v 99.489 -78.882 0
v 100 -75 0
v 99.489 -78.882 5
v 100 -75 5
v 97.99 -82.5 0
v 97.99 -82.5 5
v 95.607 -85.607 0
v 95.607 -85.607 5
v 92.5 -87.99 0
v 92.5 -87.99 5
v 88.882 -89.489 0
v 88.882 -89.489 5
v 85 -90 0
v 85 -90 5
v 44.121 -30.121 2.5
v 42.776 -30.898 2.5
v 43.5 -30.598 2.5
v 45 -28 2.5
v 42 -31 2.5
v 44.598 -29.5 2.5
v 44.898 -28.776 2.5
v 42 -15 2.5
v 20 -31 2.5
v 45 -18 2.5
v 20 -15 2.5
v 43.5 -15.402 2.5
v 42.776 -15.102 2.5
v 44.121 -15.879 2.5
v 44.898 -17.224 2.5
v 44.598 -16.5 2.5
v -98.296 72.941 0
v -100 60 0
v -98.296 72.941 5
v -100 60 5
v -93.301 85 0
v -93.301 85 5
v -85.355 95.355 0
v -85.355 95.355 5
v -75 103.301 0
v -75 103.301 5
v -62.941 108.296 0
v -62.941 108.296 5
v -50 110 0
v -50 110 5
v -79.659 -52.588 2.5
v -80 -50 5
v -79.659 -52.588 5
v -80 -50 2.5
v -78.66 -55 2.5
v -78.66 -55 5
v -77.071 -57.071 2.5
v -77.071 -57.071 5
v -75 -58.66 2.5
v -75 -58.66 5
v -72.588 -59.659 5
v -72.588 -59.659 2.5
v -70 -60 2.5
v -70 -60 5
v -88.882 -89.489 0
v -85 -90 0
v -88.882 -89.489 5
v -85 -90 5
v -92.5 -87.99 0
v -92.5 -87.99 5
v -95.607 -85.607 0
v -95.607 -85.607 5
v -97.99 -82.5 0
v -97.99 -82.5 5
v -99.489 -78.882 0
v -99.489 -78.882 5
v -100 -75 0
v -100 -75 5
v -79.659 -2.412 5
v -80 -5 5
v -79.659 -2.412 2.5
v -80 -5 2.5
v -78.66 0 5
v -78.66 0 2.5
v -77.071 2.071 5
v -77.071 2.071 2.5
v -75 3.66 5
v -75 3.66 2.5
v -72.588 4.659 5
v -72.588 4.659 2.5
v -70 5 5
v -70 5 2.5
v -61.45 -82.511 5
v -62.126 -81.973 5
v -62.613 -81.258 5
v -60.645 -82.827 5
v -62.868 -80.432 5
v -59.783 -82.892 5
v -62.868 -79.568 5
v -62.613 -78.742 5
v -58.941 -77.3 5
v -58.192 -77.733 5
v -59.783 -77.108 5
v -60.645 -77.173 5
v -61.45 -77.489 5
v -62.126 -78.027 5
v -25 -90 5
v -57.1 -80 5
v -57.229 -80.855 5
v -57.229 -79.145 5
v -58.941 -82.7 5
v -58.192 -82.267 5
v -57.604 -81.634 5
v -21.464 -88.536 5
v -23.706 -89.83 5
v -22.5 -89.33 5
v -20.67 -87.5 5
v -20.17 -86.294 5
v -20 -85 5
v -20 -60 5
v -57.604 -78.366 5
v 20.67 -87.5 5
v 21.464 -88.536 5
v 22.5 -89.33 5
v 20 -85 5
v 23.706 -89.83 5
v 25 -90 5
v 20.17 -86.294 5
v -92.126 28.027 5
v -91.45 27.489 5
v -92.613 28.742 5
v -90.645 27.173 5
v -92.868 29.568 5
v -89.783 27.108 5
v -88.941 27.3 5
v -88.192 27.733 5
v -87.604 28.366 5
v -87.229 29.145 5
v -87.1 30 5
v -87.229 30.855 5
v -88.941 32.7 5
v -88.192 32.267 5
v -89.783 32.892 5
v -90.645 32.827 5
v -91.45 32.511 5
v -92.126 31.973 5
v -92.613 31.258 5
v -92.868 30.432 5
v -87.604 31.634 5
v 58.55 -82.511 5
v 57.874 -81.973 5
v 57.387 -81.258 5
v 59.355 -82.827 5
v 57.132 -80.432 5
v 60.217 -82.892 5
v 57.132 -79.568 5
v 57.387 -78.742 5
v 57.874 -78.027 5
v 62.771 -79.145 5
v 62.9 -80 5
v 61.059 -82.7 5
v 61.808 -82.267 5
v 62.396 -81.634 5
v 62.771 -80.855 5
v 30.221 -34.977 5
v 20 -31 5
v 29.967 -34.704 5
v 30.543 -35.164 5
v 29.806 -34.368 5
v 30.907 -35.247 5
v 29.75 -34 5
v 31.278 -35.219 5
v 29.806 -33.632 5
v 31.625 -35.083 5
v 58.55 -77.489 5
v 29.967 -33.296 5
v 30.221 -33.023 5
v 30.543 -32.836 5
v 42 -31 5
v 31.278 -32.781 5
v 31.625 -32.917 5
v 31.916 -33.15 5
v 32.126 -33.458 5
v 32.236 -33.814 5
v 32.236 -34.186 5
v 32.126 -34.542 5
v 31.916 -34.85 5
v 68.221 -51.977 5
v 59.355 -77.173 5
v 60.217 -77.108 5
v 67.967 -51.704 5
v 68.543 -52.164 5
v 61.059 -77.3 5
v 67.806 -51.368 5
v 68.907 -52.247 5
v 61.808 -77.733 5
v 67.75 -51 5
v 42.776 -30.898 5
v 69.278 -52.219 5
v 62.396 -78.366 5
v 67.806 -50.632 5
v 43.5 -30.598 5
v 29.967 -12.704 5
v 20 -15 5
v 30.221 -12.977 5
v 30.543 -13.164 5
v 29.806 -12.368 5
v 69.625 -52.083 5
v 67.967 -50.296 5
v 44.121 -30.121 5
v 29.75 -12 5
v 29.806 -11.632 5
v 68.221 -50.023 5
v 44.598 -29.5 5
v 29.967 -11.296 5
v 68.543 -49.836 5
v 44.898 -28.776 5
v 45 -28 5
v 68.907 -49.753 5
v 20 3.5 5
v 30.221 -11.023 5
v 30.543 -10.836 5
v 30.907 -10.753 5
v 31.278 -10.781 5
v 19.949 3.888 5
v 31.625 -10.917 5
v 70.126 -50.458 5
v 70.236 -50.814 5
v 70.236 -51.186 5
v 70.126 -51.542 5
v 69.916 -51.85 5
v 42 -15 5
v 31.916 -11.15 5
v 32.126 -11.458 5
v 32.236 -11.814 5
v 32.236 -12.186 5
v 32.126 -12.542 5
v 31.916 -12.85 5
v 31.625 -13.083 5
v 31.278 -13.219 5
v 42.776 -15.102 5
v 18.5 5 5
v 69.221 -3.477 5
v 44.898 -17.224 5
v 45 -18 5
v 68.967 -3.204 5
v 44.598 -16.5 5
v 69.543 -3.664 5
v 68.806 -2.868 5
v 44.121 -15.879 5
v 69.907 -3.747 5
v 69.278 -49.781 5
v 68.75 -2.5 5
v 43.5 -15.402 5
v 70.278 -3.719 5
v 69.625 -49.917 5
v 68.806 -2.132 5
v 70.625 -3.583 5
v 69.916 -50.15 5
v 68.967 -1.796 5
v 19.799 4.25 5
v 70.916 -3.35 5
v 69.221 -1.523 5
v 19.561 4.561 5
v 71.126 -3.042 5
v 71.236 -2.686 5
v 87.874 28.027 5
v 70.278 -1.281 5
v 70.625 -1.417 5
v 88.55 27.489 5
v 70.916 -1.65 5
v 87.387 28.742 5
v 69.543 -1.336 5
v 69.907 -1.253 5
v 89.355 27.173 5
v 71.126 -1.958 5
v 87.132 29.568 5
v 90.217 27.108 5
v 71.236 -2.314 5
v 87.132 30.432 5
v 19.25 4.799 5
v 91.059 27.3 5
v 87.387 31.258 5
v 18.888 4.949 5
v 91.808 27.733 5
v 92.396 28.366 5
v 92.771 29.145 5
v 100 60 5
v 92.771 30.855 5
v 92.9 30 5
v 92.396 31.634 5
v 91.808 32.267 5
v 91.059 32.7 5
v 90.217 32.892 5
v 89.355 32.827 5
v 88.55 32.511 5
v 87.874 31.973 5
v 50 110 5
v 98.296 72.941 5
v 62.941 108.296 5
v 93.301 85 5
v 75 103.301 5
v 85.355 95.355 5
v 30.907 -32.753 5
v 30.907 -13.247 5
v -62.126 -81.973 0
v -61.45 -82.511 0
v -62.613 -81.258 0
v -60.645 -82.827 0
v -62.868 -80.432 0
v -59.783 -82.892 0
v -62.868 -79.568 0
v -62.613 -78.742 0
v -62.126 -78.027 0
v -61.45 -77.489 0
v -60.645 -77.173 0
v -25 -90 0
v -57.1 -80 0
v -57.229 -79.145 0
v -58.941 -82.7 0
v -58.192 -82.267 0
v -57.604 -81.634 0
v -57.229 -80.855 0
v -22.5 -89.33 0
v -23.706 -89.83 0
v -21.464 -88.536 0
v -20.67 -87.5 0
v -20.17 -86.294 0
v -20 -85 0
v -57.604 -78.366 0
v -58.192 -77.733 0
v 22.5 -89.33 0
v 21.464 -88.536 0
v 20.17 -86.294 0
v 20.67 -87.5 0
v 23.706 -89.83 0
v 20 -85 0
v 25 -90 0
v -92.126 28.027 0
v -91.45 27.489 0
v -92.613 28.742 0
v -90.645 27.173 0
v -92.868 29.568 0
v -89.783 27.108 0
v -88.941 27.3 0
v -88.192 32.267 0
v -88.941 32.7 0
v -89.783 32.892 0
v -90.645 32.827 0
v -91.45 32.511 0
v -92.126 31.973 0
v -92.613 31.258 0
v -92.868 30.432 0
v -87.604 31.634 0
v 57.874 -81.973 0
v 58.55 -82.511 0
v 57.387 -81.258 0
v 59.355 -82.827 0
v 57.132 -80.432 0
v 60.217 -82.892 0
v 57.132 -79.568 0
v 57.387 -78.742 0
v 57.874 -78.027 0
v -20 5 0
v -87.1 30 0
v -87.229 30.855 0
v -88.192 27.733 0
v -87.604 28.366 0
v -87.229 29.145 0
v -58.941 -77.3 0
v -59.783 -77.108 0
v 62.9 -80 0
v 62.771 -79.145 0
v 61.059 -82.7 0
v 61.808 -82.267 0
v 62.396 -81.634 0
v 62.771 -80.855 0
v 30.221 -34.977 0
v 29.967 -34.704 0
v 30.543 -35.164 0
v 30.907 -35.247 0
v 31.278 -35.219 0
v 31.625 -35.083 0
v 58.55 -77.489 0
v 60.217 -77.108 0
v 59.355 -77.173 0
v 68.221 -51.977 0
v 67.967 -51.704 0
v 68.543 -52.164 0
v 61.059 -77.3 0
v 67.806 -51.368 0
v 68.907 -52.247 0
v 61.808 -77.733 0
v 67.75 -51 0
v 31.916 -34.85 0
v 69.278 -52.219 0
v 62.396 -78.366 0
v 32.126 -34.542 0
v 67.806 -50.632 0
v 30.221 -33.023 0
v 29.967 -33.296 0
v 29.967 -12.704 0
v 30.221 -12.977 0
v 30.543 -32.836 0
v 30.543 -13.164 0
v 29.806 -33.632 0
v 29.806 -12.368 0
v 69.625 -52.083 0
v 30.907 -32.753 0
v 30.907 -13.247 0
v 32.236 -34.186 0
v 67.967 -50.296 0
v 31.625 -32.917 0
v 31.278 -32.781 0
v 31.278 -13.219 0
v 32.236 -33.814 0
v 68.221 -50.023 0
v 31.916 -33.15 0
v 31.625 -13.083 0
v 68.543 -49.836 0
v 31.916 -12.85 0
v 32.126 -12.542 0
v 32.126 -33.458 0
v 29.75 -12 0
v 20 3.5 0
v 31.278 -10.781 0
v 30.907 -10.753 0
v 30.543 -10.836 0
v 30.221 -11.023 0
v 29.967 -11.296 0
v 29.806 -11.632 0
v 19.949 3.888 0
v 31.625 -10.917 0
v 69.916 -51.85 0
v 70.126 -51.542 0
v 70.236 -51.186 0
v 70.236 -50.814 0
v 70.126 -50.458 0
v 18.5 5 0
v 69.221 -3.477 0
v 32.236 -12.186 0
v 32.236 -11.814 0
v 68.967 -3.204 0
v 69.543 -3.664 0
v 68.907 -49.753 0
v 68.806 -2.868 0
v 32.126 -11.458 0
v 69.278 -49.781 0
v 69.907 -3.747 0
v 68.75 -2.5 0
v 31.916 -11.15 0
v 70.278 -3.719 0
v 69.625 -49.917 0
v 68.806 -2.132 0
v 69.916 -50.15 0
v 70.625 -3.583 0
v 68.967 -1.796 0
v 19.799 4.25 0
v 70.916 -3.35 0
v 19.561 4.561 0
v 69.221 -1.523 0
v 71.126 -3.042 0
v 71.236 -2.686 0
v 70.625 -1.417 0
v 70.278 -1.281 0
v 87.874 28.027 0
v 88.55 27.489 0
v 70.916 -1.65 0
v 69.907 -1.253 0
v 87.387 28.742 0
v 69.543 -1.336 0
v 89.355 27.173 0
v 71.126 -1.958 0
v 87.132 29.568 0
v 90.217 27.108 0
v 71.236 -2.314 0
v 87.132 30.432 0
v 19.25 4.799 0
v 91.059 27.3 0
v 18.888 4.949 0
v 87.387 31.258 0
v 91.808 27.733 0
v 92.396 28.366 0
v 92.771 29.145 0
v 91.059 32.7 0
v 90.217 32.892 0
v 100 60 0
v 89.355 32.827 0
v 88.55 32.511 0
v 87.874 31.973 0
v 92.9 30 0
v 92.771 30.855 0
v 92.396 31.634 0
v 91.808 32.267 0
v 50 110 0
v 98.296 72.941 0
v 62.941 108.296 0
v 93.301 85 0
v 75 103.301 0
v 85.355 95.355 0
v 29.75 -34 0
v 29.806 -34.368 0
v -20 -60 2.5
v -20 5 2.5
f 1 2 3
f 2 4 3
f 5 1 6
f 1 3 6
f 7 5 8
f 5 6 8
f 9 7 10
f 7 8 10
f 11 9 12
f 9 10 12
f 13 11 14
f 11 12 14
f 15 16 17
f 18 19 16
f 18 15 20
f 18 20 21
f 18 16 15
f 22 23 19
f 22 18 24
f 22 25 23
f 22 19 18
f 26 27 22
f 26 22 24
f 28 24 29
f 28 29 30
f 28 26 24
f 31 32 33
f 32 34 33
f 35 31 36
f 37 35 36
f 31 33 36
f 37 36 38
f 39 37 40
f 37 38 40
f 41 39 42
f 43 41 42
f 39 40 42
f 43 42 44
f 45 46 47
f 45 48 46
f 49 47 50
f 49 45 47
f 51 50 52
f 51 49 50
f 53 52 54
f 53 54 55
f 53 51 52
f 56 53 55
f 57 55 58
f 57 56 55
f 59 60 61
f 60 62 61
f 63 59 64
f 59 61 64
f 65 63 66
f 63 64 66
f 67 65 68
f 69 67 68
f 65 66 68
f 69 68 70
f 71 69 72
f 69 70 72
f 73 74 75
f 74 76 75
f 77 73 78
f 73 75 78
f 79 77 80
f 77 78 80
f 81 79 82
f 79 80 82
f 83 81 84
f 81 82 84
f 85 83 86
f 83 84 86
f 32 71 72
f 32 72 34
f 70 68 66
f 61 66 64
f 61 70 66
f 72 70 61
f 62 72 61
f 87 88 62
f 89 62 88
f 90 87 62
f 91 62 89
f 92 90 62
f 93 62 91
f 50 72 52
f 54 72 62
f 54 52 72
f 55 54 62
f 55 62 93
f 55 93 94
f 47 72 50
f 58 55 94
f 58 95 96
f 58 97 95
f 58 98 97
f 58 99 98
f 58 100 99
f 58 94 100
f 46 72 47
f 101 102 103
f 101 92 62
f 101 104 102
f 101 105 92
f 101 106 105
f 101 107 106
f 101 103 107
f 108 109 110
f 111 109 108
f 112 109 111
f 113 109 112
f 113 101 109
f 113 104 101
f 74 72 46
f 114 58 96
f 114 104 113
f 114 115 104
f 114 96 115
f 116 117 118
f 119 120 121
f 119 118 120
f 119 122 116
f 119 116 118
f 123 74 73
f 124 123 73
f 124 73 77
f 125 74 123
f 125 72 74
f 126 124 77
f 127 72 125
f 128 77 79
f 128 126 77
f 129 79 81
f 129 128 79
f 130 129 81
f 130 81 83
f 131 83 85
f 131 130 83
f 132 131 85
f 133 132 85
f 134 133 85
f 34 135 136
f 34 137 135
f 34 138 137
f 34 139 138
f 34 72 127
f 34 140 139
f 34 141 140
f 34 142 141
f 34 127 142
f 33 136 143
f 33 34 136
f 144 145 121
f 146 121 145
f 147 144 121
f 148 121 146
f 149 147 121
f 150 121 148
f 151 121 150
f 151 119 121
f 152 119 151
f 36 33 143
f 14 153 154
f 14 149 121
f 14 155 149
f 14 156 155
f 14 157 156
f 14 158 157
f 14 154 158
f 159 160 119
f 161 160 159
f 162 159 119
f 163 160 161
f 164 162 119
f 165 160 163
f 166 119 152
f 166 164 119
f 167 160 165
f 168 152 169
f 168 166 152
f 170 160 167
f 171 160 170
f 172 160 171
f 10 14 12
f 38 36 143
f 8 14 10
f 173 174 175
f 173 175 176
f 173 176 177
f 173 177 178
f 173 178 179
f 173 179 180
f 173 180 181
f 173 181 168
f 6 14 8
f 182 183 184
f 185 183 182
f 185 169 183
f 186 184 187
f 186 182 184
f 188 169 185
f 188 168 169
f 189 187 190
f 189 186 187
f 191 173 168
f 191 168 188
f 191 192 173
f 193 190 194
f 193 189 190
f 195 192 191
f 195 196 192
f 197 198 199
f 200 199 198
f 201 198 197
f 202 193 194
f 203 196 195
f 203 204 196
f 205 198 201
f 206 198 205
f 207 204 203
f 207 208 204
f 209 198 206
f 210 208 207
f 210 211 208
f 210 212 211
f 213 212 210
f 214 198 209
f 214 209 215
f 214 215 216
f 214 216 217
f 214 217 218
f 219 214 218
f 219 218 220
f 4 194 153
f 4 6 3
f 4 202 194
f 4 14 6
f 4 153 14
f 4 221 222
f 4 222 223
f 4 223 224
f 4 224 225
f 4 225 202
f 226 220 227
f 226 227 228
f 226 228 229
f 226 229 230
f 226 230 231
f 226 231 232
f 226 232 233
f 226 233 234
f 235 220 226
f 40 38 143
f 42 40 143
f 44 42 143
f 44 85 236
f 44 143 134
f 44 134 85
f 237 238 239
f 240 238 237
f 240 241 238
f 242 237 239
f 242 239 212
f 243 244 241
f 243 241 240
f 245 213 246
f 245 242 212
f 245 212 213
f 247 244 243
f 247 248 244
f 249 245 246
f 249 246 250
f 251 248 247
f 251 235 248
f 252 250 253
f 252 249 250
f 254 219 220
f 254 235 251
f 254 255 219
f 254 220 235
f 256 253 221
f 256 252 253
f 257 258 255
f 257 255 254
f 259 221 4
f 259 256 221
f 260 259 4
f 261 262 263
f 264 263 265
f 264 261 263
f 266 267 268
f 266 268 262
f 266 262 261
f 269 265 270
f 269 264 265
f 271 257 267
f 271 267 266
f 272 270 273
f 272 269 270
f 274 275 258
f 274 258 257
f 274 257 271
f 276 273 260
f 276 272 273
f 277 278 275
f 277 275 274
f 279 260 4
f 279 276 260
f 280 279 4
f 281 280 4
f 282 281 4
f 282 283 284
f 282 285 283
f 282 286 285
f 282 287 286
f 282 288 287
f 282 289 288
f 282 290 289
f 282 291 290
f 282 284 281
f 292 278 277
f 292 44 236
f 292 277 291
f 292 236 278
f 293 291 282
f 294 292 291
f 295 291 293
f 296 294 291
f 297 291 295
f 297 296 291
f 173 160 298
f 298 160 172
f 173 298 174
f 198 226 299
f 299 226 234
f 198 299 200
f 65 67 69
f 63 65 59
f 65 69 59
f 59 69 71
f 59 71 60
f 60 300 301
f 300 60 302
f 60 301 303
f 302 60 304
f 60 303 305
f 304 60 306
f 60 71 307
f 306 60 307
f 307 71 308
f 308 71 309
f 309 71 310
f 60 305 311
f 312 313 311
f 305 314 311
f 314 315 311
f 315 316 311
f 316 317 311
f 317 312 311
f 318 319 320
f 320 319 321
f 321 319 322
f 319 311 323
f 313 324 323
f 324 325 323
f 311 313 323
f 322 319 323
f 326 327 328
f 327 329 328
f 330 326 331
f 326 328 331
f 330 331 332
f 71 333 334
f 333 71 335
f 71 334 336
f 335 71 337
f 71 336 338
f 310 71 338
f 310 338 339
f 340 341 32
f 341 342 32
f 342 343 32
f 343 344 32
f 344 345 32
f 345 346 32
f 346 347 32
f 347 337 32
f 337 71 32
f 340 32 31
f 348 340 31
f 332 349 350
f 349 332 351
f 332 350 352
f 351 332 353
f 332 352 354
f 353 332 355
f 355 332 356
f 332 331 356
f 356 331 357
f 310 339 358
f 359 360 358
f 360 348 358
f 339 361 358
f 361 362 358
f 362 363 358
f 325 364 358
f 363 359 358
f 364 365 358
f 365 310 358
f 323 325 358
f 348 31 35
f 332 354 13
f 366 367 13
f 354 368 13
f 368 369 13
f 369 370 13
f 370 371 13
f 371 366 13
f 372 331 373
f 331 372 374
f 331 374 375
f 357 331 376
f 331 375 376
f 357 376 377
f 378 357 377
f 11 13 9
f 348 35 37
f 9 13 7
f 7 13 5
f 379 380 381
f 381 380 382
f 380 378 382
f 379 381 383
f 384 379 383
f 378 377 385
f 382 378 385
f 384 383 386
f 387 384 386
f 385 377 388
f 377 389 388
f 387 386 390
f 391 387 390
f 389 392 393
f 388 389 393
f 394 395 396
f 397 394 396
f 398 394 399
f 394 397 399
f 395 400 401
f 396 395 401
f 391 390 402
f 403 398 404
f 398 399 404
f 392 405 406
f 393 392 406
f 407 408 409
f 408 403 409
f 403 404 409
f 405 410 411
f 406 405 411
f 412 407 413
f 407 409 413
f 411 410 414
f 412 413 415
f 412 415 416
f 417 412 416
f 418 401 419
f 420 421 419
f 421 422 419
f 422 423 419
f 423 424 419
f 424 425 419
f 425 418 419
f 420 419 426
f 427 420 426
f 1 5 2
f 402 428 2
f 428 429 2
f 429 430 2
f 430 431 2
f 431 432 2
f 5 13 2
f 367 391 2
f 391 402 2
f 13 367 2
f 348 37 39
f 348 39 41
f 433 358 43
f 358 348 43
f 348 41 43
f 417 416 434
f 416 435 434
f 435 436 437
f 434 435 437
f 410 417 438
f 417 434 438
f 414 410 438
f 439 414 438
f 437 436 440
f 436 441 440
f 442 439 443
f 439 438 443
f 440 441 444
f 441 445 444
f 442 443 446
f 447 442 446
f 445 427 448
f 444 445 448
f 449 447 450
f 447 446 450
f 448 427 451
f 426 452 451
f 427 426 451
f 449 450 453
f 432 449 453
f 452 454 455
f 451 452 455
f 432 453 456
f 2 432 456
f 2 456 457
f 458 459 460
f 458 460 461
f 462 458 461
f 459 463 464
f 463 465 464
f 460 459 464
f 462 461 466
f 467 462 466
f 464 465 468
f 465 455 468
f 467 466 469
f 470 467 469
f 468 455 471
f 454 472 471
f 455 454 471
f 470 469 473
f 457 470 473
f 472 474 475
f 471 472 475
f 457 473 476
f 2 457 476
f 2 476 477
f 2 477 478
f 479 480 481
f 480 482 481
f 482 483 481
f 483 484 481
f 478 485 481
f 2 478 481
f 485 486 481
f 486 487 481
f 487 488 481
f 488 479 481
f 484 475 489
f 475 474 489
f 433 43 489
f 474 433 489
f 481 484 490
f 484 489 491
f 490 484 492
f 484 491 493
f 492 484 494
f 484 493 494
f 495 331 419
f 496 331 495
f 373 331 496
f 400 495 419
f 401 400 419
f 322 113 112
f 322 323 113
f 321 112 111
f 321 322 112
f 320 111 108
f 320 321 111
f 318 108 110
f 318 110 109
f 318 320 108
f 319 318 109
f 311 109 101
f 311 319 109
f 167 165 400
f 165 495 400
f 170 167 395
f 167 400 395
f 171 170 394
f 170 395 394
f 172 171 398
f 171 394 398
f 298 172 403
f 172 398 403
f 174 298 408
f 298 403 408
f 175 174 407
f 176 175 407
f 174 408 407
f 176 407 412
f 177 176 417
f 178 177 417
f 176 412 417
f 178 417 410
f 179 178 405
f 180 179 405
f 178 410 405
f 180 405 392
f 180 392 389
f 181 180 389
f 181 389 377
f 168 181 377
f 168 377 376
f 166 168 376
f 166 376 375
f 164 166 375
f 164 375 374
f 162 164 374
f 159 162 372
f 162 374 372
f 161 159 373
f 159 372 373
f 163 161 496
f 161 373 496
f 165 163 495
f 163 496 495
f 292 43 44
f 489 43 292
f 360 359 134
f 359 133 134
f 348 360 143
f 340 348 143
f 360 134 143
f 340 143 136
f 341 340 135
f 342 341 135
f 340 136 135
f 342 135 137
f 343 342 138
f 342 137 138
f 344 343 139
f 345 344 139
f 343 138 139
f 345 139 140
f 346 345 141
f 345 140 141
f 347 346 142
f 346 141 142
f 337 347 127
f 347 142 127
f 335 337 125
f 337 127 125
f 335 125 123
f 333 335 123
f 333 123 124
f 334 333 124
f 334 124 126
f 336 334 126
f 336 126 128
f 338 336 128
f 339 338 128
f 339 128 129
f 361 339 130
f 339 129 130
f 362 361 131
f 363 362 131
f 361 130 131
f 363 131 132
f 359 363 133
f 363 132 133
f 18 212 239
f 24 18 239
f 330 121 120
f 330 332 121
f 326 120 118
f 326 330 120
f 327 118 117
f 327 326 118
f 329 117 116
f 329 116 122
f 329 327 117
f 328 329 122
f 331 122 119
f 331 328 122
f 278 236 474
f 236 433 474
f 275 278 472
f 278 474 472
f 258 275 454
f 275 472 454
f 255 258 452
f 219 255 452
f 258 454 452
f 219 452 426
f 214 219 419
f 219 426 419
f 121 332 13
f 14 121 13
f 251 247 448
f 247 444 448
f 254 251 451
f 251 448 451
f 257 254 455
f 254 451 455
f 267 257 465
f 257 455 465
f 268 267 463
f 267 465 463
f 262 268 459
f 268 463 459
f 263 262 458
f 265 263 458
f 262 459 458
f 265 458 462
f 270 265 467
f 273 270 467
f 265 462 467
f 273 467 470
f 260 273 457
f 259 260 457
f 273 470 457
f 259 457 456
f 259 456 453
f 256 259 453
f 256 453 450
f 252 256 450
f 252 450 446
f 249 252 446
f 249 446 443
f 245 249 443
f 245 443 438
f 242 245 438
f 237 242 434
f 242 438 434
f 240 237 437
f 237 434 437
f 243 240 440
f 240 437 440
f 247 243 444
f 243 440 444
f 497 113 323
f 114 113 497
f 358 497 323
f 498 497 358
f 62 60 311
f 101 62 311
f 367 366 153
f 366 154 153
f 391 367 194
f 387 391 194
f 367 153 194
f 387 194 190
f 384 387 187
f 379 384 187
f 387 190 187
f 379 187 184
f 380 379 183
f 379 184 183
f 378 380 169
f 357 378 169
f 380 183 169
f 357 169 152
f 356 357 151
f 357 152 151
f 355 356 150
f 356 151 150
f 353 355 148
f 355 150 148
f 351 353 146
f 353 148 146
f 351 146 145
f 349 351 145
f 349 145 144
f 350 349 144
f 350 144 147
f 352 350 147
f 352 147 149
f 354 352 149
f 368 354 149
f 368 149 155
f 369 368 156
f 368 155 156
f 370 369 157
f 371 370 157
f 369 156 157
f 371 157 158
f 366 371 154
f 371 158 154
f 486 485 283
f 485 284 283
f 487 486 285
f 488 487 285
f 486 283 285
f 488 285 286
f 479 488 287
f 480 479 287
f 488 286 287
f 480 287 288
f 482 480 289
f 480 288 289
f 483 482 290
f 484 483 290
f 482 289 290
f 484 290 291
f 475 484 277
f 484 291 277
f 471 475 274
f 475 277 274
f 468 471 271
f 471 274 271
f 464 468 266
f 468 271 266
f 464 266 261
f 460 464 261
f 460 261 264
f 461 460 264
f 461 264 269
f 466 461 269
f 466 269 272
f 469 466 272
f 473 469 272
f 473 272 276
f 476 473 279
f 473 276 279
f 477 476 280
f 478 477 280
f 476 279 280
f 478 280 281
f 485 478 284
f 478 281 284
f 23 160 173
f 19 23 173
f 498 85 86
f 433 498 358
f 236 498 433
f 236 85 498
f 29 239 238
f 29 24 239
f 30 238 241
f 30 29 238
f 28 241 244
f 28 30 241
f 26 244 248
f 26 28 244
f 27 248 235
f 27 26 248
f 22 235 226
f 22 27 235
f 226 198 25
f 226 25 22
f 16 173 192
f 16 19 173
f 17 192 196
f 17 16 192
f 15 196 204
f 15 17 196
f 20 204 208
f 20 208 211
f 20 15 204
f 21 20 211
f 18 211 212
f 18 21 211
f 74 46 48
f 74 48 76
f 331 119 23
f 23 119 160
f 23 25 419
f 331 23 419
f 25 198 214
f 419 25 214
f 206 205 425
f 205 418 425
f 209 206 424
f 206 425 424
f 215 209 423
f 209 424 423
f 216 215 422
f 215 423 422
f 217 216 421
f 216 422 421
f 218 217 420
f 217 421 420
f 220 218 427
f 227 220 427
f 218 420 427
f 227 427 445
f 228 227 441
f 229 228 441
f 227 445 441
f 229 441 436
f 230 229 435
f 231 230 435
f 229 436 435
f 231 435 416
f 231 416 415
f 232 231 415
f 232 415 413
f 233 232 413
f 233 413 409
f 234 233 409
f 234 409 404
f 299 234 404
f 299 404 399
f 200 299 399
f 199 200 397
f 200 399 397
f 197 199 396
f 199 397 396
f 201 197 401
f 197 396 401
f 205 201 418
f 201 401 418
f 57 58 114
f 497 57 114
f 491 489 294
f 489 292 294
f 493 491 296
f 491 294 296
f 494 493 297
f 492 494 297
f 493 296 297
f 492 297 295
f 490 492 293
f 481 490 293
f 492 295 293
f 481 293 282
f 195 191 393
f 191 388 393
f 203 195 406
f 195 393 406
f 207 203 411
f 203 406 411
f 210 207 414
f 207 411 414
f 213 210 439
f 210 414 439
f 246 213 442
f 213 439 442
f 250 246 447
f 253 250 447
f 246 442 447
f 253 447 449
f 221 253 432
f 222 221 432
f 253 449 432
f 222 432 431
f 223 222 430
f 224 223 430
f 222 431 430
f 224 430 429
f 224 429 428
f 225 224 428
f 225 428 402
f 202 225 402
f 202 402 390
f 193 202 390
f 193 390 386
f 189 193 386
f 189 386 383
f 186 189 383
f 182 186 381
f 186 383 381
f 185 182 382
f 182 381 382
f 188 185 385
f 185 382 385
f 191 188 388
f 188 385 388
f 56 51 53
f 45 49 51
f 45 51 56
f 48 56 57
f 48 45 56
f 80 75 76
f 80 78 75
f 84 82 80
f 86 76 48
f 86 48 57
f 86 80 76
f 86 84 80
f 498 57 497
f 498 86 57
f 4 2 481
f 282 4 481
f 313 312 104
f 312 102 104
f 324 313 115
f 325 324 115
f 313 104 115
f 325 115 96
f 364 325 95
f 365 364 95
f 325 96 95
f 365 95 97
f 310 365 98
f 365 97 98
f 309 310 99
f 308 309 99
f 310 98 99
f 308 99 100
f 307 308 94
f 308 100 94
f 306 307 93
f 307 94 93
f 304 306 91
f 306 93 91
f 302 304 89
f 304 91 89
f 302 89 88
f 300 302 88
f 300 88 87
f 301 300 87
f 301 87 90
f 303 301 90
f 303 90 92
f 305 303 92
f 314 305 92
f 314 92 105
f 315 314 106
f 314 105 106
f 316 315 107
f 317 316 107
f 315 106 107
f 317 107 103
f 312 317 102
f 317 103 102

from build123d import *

# Parameters (mm, degrees)
SKETCH_1_W             = 200
SKETCH_1_H             = 200
EXTRUDE_1_DEPTH        = 5
SKETCH_2_W             = 40
SKETCH_2_H             = 95
CUT_EXTRUDE_1_DEPTH    = 149.744747806
FILLET_1_R             = 50
FILLET_2_R             = 1.5
M3X0_5_1_D             = 2.5
M3X0_5_1_DEPTH         = 5
M3X0_5_1_TIP           = 0.751075774
FILLET_3_R             = 15
FILLET_4_R             = 5
HOLE_WIZARD_M5_1_D     = 5.8
HOLE_WIZARD_M5_1_DEPTH = 5
HOLE_WIZARD_M5_1_TIP   = 1.742495795
SKETCH_10_W            = 60
SKETCH_10_H            = 65
CUT_EXTRUDE_2_DEPTH    = 2.5
FILLET_5_R             = 10
SKETCH_11_W            = 25
SKETCH_11_H            = 16
CUT_EXTRUDE_3_DEPTH    = 2.5
FILLET_6_R             = 3


with BuildPart() as part:
    # ｽｹｯﾁ1 → ﾎﾞｽ - 押し出し1 (new body)
    with BuildSketch(Plane.XY):
        with Locations((0, 10)):
            Rectangle(SKETCH_1_W, SKETCH_1_H)
    extrude(amount=EXTRUDE_1_DEPTH)

    # ｽｹｯﾁ2 → ｶｯﾄ - 押し出し1 (cut, through all)
    with BuildSketch(Plane.XY.offset(5)):
        with Locations((0, -42.5)):
            Rectangle(SKETCH_2_W, SKETCH_2_H)
    extrude(amount=-CUT_EXTRUDE_1_DEPTH, mode=Mode.SUBTRACT)

    # ﾌｨﾚｯﾄ1
    fillet_1_edges = [part.edges().sort_by_distance(p)[0] for p in [
        (-100, 110, 2.5),
        (100, 110, 2.5),
    ]]
    fillet(fillet_1_edges, radius=FILLET_1_R)

    # ﾌｨﾚｯﾄ2
    fillet_2_edges = [part.edges().sort_by_distance(p)[0] for p in [
        (20, 5, 2.5),
    ]]
    fillet(fillet_2_edges, radius=FILLET_2_R)

    # M3x0.5 ねじ穴用ねじ下穴ﾄﾞﾘﾙ1
    with Locations(Plane.XY.offset(5)):
        with Locations((70, -2.5), (31, -12), (31, -34), (69, -51)):
            Hole(M3X0_5_1_D / 2, depth=M3X0_5_1_DEPTH)
            with Locations((0, 0, -(M3X0_5_1_DEPTH + M3X0_5_1_TIP / 2))):  # 118° drill point
                Cone(0, M3X0_5_1_D / 2, M3X0_5_1_TIP, mode=Mode.SUBTRACT)

    # ﾌｨﾚｯﾄ3
    fillet_3_edges = [part.edges().sort_by_distance(p)[0] for p in [
        (100, -90, 2.5),
        (-100, -90, 2.5),
    ]]
    fillet(fillet_3_edges, radius=FILLET_3_R)

    # ﾌｨﾚｯﾄ4
    fillet_4_edges = [part.edges().sort_by_distance(p)[0] for p in [
        (-20, -90, 2.5),
        (20, -90, 2.5),
    ]]
    fillet(fillet_4_edges, radius=FILLET_4_R)

    # M5 すきま穴1
    with Locations(Plane(origin=(0, 0, 0), x_dir=(-1, 0, 0), z_dir=(0, 0, -1))):
        with Locations((-60, -80), (60, -80), (-90, 30), (90, 30)):
            Hole(HOLE_WIZARD_M5_1_D / 2, depth=HOLE_WIZARD_M5_1_DEPTH)
            with Locations((0, 0, -(HOLE_WIZARD_M5_1_DEPTH + HOLE_WIZARD_M5_1_TIP / 2))):  # 118° drill point
                Cone(0, HOLE_WIZARD_M5_1_D / 2, HOLE_WIZARD_M5_1_TIP, mode=Mode.SUBTRACT)

    # ｽｹｯﾁ10 → ｶｯﾄ - 押し出し2 (cut)
    with BuildSketch(Plane.XY.offset(5)):
        with Locations((-50, -27.5)):
            Rectangle(SKETCH_10_W, SKETCH_10_H)
    extrude(amount=-CUT_EXTRUDE_2_DEPTH, mode=Mode.SUBTRACT)

    # ﾌｨﾚｯﾄ5
    fillet_5_edges = [part.edges().sort_by_distance(p)[0] for p in [
        (-80, -60, 3.75),
        (-80, 5, 3.75),
    ]]
    fillet(fillet_5_edges, radius=FILLET_5_R)

    # ｽｹｯﾁ11 → ｶｯﾄ - 押し出し3 (cut)
    with BuildSketch(Plane.XY.offset(5)):
        with Locations((32.5, -23)):
            Rectangle(SKETCH_11_W, SKETCH_11_H)
    extrude(amount=-CUT_EXTRUDE_3_DEPTH, mode=Mode.SUBTRACT)

    # ﾌｨﾚｯﾄ6
    fillet_6_edges = [part.edges().sort_by_distance(p)[0] for p in [
        (45, -15, 3.75),
        (45, -31, 3.75),
    ]]
    fillet(fillet_6_edges, radius=FILLET_6_R)


solid = part.part
